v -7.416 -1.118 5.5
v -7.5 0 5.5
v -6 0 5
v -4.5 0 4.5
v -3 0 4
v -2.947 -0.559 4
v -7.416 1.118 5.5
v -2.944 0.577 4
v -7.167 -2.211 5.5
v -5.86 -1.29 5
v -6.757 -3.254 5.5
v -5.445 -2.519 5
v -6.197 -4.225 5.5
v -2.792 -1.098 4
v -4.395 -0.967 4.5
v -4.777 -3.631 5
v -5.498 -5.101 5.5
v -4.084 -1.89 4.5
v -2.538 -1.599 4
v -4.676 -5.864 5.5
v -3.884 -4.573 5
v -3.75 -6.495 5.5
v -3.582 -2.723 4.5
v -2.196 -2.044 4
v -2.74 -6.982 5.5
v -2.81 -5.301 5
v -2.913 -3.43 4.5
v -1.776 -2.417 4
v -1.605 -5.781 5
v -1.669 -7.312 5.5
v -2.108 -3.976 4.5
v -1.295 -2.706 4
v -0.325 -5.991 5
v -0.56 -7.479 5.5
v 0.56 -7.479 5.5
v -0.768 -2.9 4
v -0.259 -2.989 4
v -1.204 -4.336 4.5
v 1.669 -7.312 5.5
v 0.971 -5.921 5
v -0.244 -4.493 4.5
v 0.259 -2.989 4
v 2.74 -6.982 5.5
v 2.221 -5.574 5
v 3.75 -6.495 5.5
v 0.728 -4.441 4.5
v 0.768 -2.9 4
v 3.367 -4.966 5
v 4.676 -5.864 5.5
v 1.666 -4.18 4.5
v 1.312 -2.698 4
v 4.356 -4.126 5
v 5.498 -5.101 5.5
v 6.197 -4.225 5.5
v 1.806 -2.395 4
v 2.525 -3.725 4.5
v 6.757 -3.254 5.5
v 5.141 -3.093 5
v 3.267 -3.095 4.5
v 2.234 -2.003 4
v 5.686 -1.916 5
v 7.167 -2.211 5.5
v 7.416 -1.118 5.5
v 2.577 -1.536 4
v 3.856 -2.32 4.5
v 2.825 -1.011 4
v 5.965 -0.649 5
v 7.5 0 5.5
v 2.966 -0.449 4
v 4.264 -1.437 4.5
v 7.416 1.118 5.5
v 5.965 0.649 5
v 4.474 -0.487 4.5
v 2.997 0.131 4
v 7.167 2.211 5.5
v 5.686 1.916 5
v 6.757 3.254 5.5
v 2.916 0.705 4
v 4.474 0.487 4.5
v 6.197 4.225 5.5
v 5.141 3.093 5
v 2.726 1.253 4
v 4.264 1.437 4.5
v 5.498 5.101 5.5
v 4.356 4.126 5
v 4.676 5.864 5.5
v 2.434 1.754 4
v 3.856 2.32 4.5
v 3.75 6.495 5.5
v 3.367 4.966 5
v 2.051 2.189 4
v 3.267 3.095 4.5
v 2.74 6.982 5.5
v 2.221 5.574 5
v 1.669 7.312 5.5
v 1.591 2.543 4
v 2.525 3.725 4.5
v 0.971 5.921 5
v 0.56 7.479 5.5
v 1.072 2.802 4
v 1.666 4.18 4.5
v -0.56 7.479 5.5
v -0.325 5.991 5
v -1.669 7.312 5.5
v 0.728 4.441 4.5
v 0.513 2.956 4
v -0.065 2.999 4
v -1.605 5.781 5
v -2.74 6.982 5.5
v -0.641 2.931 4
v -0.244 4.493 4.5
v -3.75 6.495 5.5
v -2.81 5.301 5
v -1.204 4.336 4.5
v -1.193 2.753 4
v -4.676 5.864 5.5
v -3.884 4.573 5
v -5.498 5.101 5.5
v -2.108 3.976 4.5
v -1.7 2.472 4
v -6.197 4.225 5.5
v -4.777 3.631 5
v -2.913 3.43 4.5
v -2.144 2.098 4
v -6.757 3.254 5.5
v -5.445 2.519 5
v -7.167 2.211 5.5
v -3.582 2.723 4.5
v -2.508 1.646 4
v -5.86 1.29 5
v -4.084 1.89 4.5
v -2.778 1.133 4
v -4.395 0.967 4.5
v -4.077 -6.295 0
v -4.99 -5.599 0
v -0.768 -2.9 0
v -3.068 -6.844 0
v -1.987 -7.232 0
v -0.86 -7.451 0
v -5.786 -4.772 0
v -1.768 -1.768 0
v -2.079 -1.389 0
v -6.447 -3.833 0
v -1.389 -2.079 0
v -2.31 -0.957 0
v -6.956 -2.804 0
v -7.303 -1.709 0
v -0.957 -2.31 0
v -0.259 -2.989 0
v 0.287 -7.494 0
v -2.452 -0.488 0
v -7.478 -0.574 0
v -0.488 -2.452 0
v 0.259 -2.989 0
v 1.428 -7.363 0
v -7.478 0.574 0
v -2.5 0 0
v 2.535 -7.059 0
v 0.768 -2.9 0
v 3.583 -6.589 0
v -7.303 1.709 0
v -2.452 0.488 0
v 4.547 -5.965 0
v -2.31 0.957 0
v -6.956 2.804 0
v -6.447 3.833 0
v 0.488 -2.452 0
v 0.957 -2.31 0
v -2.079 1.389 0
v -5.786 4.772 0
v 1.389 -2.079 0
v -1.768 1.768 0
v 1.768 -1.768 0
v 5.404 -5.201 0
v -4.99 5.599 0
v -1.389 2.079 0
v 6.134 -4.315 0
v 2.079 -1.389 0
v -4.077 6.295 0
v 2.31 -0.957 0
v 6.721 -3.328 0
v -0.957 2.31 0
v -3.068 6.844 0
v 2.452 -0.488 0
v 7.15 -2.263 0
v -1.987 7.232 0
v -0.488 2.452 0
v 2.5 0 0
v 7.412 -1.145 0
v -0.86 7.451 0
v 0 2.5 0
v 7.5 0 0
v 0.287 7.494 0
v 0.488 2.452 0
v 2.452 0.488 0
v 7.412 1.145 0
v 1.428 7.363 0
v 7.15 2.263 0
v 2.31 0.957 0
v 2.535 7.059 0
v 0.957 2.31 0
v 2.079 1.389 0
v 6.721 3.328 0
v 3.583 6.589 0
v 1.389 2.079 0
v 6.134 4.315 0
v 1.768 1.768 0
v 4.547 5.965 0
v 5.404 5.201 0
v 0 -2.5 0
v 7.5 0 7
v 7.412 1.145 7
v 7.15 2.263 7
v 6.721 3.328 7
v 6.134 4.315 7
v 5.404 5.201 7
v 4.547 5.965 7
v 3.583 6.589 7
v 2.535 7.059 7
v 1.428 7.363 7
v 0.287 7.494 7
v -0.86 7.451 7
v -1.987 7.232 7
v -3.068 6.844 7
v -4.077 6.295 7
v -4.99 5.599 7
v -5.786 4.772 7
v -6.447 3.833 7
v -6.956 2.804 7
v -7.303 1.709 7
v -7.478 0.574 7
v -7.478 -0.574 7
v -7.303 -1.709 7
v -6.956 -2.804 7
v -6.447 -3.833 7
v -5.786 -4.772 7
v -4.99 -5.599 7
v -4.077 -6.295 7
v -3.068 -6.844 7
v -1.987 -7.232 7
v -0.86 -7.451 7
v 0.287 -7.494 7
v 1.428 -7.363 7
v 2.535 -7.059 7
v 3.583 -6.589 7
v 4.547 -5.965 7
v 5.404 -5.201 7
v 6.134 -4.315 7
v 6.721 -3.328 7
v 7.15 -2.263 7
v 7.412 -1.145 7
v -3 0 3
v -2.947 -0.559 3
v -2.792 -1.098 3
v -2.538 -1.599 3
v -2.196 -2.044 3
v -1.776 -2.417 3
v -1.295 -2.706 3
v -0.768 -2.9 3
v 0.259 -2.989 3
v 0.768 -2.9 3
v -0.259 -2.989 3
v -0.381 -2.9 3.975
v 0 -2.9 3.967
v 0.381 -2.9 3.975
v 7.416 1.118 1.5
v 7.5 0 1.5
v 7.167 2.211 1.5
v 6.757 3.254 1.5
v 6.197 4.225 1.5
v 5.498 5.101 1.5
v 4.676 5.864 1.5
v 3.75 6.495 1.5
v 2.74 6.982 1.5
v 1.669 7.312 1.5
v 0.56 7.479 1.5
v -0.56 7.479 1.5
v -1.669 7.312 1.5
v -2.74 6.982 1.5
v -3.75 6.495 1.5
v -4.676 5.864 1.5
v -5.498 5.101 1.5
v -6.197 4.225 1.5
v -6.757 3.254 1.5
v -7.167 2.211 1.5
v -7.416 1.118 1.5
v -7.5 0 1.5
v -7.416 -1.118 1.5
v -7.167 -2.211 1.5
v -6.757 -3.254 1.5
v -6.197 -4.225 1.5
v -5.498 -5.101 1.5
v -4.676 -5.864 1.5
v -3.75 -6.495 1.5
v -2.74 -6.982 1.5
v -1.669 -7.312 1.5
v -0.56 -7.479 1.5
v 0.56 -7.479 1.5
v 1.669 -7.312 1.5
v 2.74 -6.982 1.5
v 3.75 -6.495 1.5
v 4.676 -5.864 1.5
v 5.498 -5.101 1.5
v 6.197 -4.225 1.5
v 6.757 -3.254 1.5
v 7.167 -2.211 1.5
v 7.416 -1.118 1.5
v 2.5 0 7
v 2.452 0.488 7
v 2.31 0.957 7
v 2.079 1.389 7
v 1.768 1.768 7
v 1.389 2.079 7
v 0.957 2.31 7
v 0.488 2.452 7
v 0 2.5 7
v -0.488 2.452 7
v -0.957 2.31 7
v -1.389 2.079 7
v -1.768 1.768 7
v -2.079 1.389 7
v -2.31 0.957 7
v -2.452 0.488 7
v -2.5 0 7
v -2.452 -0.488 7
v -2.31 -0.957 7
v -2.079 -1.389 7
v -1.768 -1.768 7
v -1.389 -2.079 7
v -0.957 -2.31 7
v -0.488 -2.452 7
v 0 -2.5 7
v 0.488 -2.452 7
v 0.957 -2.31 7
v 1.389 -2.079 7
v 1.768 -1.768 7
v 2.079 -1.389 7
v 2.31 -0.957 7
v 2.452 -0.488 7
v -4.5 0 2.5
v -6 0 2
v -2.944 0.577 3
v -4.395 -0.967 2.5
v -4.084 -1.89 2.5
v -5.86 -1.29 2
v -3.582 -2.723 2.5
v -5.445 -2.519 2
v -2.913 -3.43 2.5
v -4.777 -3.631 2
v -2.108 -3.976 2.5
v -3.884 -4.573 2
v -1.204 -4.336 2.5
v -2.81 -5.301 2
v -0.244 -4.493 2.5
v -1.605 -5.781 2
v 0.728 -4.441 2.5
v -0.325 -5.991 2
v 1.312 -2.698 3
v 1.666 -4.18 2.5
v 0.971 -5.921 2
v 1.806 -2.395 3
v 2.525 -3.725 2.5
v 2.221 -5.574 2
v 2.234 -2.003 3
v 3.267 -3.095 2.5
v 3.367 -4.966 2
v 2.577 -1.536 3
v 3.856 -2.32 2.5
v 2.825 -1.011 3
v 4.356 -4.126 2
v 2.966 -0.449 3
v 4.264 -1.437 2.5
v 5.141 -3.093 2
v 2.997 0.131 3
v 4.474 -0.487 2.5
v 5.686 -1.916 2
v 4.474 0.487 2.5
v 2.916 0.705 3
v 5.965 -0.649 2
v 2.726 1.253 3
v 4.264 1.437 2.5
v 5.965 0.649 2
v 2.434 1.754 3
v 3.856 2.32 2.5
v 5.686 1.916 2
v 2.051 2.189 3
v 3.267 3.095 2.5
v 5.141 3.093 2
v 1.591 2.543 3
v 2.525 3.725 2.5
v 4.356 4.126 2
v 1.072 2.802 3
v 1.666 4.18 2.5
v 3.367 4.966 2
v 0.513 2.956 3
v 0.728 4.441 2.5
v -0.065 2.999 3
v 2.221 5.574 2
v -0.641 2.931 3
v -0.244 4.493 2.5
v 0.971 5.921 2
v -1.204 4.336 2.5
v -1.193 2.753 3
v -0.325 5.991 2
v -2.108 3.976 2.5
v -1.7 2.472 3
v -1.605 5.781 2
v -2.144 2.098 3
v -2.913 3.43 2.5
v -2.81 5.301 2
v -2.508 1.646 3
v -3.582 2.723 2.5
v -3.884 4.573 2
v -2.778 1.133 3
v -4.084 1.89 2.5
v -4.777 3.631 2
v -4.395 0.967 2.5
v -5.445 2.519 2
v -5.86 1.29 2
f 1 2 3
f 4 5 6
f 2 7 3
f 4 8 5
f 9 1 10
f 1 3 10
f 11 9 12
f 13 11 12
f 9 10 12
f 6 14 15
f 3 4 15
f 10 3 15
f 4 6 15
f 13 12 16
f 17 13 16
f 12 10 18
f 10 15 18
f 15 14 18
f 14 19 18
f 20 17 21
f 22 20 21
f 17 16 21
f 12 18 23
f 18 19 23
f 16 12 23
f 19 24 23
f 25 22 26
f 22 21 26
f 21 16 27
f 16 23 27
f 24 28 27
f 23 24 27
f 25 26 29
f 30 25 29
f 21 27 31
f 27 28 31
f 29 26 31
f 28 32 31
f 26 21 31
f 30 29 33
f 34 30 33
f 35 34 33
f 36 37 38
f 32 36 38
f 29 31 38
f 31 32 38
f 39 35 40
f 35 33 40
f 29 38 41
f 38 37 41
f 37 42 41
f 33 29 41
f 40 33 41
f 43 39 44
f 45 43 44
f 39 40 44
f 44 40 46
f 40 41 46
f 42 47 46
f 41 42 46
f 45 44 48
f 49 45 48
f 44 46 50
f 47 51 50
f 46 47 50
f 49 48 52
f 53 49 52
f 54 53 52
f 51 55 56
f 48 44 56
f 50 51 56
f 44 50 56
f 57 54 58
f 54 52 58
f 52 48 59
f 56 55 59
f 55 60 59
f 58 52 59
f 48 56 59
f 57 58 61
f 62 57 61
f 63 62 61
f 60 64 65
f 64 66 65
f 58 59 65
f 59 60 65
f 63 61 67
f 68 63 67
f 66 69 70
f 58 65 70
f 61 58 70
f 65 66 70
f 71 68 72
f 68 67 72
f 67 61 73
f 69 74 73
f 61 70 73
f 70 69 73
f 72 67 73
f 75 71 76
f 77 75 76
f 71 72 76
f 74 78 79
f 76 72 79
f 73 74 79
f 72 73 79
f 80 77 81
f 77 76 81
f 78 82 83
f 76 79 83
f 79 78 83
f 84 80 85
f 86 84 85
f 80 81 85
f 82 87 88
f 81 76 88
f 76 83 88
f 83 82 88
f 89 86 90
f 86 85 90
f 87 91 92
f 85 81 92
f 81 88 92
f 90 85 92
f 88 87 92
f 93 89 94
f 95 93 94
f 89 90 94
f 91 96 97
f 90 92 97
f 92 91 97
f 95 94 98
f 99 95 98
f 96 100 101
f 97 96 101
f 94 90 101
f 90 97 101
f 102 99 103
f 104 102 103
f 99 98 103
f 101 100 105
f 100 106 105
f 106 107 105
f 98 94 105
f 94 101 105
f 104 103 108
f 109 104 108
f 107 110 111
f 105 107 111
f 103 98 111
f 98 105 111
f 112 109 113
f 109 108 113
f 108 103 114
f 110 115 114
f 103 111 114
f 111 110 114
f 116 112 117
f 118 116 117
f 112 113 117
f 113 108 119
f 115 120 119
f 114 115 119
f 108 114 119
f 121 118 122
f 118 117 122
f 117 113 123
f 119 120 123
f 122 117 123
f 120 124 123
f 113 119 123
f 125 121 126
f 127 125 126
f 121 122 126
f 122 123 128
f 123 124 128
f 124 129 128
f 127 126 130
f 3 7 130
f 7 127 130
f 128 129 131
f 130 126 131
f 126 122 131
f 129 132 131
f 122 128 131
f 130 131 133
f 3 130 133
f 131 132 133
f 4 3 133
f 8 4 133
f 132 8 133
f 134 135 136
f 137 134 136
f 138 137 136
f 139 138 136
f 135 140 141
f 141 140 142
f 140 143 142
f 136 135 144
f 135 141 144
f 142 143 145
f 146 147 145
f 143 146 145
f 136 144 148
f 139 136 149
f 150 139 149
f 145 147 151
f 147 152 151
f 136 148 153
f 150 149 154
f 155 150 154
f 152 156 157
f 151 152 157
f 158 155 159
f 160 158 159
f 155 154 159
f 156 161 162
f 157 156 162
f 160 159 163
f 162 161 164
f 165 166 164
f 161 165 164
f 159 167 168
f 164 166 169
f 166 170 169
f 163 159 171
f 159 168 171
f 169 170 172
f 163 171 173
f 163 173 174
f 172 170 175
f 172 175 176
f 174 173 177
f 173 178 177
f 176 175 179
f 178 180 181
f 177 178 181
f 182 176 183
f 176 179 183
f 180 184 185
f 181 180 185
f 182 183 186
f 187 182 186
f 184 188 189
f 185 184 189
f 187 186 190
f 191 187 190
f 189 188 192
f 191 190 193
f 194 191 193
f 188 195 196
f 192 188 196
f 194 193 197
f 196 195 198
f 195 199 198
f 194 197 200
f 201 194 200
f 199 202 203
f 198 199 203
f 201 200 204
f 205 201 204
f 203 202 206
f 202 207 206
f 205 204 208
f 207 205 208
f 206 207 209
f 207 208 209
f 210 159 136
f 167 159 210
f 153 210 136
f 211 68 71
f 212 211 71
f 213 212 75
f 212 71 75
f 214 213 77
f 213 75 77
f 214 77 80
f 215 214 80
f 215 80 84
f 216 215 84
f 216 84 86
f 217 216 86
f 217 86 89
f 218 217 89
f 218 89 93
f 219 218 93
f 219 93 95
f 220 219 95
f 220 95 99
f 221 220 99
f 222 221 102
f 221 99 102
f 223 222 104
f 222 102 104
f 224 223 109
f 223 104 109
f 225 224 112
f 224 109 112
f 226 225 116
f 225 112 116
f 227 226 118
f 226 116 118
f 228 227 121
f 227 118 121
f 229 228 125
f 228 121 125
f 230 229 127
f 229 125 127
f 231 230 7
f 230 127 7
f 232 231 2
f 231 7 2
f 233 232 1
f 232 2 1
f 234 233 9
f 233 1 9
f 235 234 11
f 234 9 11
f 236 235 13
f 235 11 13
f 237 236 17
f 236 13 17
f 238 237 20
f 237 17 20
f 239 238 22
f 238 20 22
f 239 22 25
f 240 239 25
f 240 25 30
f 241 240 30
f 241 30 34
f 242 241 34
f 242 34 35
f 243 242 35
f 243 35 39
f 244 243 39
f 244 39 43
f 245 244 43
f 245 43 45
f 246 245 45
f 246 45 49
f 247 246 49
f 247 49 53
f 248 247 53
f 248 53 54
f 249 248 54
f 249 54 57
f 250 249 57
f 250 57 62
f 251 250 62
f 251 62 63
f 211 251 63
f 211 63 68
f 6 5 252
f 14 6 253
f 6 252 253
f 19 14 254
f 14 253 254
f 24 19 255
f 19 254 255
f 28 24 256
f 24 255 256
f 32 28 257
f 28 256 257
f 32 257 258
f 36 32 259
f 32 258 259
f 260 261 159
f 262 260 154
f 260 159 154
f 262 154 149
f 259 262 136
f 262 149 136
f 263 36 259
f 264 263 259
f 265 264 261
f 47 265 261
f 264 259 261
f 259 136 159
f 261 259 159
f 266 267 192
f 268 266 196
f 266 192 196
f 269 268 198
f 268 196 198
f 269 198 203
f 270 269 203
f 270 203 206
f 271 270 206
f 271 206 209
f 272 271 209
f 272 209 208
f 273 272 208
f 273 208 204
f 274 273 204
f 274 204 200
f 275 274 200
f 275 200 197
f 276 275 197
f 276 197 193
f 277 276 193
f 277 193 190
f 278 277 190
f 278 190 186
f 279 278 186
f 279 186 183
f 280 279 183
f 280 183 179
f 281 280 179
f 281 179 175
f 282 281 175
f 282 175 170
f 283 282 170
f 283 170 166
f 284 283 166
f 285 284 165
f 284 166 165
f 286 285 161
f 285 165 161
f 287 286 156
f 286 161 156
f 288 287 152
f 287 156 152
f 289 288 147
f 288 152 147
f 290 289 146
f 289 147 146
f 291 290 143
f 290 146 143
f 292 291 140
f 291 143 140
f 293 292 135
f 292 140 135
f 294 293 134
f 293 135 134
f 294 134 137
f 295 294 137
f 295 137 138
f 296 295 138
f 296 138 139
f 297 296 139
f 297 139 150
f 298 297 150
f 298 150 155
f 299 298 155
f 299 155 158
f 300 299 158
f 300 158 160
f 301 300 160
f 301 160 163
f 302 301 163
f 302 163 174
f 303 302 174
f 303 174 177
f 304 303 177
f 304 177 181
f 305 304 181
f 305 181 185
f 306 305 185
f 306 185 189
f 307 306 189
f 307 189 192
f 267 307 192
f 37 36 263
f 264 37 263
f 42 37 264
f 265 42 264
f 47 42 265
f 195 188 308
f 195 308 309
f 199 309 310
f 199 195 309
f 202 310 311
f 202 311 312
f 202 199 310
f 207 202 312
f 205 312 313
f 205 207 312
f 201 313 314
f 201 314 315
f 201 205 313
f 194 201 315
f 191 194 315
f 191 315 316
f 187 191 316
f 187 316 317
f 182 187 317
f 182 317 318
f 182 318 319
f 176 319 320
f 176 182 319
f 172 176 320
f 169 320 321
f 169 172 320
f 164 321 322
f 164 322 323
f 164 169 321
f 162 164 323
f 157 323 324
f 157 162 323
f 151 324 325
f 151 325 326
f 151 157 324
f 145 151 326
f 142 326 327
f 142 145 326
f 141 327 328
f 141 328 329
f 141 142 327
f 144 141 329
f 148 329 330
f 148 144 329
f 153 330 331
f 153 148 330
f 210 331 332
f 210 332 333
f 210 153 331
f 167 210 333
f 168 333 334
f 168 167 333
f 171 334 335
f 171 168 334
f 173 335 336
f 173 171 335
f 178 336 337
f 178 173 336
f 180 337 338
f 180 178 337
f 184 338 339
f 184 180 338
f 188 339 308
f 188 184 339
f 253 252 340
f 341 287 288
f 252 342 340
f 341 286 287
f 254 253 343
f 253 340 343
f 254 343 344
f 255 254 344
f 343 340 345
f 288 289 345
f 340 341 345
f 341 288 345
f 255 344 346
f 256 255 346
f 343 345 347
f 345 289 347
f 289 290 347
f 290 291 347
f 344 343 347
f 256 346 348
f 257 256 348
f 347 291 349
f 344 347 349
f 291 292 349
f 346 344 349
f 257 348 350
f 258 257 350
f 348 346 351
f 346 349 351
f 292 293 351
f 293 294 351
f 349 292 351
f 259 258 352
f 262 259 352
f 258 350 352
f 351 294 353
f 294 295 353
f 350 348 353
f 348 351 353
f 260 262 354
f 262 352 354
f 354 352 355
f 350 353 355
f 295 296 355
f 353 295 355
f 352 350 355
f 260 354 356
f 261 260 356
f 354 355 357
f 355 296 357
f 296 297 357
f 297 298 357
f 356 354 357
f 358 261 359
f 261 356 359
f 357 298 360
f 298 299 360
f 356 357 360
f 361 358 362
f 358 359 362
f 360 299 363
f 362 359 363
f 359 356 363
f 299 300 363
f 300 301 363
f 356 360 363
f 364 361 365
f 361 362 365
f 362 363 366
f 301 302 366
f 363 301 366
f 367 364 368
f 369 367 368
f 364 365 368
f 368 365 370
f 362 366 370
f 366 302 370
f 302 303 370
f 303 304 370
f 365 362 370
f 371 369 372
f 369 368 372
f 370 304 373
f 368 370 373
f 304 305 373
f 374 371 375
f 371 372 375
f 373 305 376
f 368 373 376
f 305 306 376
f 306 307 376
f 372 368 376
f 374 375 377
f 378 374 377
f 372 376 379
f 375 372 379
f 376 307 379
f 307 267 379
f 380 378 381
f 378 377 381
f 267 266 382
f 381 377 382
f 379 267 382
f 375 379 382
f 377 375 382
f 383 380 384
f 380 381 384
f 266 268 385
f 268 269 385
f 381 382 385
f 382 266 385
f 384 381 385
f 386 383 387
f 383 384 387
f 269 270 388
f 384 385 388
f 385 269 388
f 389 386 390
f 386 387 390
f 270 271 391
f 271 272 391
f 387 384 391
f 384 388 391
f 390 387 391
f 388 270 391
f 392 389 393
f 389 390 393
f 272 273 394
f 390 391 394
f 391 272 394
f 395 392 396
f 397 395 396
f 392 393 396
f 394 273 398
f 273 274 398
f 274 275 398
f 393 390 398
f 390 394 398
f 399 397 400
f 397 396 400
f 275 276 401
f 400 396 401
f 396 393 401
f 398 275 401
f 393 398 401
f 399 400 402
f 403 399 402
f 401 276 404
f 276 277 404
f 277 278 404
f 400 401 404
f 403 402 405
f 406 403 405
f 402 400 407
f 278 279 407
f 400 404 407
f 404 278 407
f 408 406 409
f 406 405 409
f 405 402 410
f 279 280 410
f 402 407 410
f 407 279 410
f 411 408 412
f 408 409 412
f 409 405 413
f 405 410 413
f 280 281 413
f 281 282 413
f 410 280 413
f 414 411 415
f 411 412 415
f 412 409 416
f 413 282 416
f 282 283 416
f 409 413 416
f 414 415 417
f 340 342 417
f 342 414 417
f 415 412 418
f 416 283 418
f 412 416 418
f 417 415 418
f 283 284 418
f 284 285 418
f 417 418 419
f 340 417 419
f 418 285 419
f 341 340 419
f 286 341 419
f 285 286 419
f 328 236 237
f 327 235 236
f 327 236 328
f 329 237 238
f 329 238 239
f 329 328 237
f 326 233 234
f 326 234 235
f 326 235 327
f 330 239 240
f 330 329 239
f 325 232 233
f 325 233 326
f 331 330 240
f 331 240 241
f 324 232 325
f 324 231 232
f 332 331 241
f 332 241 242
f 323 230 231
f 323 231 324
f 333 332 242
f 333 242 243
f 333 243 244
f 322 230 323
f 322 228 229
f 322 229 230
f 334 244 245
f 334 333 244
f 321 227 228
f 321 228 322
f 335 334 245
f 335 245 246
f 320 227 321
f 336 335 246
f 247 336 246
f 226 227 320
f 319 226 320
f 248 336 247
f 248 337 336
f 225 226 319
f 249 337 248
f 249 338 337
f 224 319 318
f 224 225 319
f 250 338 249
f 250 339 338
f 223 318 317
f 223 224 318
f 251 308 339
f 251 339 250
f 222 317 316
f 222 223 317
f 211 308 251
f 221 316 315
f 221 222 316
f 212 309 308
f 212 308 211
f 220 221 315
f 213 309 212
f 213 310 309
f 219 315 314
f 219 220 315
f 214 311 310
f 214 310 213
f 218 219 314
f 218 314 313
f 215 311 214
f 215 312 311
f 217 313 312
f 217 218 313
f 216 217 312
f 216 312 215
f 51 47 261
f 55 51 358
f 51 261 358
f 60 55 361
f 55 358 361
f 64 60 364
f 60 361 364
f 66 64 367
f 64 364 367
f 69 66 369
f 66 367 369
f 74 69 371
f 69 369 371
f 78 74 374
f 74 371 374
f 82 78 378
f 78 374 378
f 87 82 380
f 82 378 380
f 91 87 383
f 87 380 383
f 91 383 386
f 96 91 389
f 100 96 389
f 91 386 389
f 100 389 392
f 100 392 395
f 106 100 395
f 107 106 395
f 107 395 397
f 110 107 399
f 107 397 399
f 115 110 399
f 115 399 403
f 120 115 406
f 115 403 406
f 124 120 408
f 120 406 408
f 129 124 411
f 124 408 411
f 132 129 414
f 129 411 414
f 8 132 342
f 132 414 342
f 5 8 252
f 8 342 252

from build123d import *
from build123d.topology import SkipClean

# Parameters (mm, degrees)
SKETCH1_R           = 7.5
SKETCH1_R_2         = 2.5
BOSS_EXTRUDE1_DEPTH = 7
CUT_EXTRUDE2_REACH  = 14.708


with BuildPart() as part:
    # Sketch1 → Boss-Extrude1 (new body)
    with BuildSketch(Plane.XY):
        Circle(SKETCH1_R)
        Circle(SKETCH1_R_2, mode=Mode.SUBTRACT)
    extrude(amount=BOSS_EXTRUDE1_DEPTH)

    # Sketch2 → Cut-Revolve1 (revolve, cut)
    with BuildSketch(Plane(origin=(0, 0, 0), x_dir=(1, 0, 0), z_dir=(0, 1, 0)), mode=Mode.PRIVATE) as cut_revolve1_sk:
        Polygon((3, -4), (3, -3), (7.5, -1.5), (7.5, -5.5), align=None)
    revolve(cut_revolve1_sk.sketch.rotate(Axis((0, 0, 0), (0, 0, 1)), 180), axis=Axis((0, 0, 0), (0, 0, 1)), mode=Mode.SUBTRACT)

    # Cut-Extrude2: up to this cone (the profile starts outside it)
    with SkipClean():  # the faces are left unmerged after this step: merging them gives an invalid solid
        cut_extrude2_end = Plane(origin=(0, 0, 0), z_dir=(0, 0, 1)).offset(3.000001) * Cone(3e-06, 36.624, 12.207999, align=(Align.CENTER, Align.CENTER, Align.MIN), mode=Mode.PRIVATE)
        # Sketch3 → Cut-Extrude2 (cut, up to the surface)
        with BuildSketch(Plane.XY, mode=Mode.PRIVATE) as cut_extrude2_sk1:
            with BuildLine():
                Line((-0.768114575, -2.9), (0.768114575, -2.9))
                ThreePointArc((0.768114575, -2.9), (0, -3), (-0.768114575, -2.9))
            make_face()
        cut_extrude2_tool1 = extrude(cut_extrude2_sk1.sketch, amount=CUT_EXTRUDE2_REACH, mode=Mode.PRIVATE) - cut_extrude2_end
        add(cut_extrude2_tool1.solids().sort_by_distance((0, -2.940058, 0))[0], mode=Mode.SUBTRACT)


solid = part.part
